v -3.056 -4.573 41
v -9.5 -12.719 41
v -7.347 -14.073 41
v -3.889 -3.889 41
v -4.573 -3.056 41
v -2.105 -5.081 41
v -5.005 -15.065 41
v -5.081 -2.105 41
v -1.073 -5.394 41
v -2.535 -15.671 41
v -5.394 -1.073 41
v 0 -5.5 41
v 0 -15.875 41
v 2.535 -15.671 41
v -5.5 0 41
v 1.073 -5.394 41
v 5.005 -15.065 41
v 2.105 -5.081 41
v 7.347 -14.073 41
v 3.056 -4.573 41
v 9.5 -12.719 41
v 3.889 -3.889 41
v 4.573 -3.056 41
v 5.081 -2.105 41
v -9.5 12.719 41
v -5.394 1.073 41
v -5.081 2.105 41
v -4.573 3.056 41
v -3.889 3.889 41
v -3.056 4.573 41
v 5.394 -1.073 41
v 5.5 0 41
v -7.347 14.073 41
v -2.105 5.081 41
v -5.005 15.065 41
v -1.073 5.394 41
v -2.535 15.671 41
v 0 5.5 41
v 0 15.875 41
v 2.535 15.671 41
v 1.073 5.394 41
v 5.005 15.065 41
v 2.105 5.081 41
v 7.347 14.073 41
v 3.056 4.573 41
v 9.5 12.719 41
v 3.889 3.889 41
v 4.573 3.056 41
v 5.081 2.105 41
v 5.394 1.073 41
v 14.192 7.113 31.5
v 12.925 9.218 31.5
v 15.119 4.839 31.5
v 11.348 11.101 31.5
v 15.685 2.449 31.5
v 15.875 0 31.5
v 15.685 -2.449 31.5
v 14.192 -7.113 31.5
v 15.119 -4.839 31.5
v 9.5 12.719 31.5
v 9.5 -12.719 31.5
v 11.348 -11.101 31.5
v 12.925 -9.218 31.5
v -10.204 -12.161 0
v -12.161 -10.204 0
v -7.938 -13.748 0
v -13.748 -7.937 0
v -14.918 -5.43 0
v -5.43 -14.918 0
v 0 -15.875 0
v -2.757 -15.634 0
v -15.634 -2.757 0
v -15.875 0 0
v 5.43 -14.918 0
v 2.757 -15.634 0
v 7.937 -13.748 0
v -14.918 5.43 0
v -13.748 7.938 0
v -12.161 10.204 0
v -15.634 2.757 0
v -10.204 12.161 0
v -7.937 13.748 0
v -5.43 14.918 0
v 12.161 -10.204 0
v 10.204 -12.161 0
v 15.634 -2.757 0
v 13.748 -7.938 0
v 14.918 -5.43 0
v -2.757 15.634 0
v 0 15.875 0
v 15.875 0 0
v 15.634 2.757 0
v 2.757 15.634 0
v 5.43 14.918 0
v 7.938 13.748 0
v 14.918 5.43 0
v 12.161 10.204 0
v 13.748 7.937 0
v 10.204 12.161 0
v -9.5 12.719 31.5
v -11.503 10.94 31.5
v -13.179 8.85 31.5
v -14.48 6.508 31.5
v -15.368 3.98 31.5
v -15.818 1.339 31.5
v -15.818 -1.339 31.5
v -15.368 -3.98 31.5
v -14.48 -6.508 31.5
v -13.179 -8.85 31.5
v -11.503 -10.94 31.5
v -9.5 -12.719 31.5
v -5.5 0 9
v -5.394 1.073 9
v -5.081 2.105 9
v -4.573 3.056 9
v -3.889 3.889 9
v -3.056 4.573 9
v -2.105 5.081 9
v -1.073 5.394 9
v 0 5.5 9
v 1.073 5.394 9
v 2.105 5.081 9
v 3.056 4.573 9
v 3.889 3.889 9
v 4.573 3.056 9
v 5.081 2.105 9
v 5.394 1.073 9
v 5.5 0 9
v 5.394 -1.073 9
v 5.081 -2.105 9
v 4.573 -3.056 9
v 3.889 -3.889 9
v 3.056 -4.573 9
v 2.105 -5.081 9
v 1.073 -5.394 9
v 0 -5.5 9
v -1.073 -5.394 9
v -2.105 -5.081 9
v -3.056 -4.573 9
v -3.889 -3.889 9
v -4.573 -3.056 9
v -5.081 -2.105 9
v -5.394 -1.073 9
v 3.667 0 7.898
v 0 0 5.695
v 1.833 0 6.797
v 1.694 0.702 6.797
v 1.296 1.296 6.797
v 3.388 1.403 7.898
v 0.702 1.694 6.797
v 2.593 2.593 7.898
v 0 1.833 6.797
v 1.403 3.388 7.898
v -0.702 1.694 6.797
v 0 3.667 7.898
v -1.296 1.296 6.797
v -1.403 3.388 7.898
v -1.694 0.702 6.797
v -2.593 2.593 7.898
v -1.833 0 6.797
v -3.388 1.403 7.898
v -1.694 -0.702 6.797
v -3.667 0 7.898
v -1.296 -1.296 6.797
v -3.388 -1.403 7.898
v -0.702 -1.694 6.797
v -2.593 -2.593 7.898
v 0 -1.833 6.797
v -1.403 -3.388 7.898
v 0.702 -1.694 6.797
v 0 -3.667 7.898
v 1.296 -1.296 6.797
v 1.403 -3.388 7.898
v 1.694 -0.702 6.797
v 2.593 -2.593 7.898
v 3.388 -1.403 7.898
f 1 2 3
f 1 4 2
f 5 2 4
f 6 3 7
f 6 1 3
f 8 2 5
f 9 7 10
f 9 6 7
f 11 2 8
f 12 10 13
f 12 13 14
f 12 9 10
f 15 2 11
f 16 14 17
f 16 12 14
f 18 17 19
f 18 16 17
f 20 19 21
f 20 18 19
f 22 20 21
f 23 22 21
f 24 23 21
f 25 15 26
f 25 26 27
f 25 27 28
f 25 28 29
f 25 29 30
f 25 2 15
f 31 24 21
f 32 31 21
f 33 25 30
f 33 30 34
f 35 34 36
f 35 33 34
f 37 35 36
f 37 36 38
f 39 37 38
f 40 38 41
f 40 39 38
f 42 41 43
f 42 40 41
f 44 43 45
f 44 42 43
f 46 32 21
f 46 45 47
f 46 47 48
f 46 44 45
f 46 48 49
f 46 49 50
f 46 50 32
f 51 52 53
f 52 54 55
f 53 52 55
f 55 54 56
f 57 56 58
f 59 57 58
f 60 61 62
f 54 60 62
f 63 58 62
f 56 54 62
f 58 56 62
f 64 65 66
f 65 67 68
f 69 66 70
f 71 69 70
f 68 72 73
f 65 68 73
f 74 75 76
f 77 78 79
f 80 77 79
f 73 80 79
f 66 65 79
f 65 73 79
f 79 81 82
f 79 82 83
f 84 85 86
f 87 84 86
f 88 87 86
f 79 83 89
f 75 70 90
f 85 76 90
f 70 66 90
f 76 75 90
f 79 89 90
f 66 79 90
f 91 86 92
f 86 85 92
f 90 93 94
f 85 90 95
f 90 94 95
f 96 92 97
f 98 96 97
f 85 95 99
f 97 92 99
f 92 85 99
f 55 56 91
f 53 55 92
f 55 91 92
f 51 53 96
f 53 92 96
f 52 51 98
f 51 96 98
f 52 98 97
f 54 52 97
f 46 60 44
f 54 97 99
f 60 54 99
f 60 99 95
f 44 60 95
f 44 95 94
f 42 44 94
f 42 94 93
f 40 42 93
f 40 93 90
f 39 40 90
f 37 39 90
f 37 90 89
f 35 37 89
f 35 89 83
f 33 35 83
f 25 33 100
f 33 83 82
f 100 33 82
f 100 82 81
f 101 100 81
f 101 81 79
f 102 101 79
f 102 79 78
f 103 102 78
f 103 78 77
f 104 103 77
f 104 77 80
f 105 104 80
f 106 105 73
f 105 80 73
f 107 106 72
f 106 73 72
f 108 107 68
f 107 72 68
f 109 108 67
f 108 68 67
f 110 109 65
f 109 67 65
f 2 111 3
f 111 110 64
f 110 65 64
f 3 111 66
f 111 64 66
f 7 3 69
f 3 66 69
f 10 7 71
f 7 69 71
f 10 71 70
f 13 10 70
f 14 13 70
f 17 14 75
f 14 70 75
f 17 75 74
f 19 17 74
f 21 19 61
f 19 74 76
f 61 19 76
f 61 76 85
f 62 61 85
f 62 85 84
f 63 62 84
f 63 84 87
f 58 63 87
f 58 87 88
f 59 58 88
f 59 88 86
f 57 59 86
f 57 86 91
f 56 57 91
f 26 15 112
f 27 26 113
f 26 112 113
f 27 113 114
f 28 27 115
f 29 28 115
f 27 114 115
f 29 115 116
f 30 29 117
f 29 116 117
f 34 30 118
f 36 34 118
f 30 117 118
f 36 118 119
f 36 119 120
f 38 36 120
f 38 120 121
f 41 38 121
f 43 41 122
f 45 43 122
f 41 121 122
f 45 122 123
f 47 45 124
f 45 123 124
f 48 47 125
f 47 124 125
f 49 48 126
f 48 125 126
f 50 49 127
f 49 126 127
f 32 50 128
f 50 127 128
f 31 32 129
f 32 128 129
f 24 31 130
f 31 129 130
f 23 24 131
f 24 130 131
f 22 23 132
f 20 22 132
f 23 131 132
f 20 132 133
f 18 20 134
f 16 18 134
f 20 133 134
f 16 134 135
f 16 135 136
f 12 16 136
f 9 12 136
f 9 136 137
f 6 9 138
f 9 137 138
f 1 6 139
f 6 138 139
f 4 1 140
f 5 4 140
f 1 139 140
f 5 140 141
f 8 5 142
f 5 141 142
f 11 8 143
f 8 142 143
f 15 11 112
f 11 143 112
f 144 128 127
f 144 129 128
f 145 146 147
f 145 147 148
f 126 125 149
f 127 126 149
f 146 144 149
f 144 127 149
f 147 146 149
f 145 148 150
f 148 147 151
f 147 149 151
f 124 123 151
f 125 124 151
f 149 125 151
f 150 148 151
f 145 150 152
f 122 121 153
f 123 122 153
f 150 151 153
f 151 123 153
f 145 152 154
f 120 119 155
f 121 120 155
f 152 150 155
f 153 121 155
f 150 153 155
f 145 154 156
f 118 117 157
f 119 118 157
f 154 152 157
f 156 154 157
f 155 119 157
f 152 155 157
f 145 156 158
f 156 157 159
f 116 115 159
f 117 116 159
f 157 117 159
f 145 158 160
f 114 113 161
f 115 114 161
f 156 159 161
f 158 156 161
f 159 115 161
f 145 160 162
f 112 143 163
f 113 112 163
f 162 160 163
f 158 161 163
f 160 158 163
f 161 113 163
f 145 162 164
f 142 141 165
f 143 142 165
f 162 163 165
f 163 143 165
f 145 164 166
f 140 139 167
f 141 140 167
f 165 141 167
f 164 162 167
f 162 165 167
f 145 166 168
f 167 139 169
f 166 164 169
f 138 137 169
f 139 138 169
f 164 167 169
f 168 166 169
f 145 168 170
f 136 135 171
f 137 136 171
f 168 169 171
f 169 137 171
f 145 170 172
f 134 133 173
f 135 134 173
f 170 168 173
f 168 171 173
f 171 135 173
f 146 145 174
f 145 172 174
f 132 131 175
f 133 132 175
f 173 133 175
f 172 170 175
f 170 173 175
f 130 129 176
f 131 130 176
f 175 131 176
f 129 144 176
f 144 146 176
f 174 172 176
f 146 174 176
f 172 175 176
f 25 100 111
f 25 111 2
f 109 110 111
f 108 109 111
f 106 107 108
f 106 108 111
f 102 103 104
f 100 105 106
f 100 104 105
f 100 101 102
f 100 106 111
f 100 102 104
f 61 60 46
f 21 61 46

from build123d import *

# Parameters (mm, degrees)
F0_R     = 15.875
F1_DEPTH = 41
F2_W     = 7
F2_H     = 9.5
F3_DEPTH = 25
F5_D     = 11
F5_DEPTH = 32
F5_TIP   = 3.3047334047


with BuildPart() as f1:
    # F0 (on Top) → F1 (new body)
    with BuildSketch(Plane.XY):
        Circle(F0_R)
    extrude(amount=F1_DEPTH)

    # F2 (on Front) → F3 (cut, symmetric)
    with BuildSketch(Plane.XZ):
        with Locations((-13, 36.25)):
            Rectangle(F2_W, F2_H)
        with Locations((13, 36.25)):
            Rectangle(F2_W, F2_H)
    extrude(amount=F3_DEPTH, both=True, mode=Mode.SUBTRACT)

    # F5
    with Locations(Plane.XY.offset(41)):
        with Locations((0, 0)):
            Hole(F5_D / 2, depth=F5_DEPTH)
            with Locations((0, 0, -(F5_DEPTH + F5_TIP / 2))):  # 118° drill point
                Cone(0, F5_D / 2, F5_TIP, mode=Mode.SUBTRACT)


solid = f1.part
